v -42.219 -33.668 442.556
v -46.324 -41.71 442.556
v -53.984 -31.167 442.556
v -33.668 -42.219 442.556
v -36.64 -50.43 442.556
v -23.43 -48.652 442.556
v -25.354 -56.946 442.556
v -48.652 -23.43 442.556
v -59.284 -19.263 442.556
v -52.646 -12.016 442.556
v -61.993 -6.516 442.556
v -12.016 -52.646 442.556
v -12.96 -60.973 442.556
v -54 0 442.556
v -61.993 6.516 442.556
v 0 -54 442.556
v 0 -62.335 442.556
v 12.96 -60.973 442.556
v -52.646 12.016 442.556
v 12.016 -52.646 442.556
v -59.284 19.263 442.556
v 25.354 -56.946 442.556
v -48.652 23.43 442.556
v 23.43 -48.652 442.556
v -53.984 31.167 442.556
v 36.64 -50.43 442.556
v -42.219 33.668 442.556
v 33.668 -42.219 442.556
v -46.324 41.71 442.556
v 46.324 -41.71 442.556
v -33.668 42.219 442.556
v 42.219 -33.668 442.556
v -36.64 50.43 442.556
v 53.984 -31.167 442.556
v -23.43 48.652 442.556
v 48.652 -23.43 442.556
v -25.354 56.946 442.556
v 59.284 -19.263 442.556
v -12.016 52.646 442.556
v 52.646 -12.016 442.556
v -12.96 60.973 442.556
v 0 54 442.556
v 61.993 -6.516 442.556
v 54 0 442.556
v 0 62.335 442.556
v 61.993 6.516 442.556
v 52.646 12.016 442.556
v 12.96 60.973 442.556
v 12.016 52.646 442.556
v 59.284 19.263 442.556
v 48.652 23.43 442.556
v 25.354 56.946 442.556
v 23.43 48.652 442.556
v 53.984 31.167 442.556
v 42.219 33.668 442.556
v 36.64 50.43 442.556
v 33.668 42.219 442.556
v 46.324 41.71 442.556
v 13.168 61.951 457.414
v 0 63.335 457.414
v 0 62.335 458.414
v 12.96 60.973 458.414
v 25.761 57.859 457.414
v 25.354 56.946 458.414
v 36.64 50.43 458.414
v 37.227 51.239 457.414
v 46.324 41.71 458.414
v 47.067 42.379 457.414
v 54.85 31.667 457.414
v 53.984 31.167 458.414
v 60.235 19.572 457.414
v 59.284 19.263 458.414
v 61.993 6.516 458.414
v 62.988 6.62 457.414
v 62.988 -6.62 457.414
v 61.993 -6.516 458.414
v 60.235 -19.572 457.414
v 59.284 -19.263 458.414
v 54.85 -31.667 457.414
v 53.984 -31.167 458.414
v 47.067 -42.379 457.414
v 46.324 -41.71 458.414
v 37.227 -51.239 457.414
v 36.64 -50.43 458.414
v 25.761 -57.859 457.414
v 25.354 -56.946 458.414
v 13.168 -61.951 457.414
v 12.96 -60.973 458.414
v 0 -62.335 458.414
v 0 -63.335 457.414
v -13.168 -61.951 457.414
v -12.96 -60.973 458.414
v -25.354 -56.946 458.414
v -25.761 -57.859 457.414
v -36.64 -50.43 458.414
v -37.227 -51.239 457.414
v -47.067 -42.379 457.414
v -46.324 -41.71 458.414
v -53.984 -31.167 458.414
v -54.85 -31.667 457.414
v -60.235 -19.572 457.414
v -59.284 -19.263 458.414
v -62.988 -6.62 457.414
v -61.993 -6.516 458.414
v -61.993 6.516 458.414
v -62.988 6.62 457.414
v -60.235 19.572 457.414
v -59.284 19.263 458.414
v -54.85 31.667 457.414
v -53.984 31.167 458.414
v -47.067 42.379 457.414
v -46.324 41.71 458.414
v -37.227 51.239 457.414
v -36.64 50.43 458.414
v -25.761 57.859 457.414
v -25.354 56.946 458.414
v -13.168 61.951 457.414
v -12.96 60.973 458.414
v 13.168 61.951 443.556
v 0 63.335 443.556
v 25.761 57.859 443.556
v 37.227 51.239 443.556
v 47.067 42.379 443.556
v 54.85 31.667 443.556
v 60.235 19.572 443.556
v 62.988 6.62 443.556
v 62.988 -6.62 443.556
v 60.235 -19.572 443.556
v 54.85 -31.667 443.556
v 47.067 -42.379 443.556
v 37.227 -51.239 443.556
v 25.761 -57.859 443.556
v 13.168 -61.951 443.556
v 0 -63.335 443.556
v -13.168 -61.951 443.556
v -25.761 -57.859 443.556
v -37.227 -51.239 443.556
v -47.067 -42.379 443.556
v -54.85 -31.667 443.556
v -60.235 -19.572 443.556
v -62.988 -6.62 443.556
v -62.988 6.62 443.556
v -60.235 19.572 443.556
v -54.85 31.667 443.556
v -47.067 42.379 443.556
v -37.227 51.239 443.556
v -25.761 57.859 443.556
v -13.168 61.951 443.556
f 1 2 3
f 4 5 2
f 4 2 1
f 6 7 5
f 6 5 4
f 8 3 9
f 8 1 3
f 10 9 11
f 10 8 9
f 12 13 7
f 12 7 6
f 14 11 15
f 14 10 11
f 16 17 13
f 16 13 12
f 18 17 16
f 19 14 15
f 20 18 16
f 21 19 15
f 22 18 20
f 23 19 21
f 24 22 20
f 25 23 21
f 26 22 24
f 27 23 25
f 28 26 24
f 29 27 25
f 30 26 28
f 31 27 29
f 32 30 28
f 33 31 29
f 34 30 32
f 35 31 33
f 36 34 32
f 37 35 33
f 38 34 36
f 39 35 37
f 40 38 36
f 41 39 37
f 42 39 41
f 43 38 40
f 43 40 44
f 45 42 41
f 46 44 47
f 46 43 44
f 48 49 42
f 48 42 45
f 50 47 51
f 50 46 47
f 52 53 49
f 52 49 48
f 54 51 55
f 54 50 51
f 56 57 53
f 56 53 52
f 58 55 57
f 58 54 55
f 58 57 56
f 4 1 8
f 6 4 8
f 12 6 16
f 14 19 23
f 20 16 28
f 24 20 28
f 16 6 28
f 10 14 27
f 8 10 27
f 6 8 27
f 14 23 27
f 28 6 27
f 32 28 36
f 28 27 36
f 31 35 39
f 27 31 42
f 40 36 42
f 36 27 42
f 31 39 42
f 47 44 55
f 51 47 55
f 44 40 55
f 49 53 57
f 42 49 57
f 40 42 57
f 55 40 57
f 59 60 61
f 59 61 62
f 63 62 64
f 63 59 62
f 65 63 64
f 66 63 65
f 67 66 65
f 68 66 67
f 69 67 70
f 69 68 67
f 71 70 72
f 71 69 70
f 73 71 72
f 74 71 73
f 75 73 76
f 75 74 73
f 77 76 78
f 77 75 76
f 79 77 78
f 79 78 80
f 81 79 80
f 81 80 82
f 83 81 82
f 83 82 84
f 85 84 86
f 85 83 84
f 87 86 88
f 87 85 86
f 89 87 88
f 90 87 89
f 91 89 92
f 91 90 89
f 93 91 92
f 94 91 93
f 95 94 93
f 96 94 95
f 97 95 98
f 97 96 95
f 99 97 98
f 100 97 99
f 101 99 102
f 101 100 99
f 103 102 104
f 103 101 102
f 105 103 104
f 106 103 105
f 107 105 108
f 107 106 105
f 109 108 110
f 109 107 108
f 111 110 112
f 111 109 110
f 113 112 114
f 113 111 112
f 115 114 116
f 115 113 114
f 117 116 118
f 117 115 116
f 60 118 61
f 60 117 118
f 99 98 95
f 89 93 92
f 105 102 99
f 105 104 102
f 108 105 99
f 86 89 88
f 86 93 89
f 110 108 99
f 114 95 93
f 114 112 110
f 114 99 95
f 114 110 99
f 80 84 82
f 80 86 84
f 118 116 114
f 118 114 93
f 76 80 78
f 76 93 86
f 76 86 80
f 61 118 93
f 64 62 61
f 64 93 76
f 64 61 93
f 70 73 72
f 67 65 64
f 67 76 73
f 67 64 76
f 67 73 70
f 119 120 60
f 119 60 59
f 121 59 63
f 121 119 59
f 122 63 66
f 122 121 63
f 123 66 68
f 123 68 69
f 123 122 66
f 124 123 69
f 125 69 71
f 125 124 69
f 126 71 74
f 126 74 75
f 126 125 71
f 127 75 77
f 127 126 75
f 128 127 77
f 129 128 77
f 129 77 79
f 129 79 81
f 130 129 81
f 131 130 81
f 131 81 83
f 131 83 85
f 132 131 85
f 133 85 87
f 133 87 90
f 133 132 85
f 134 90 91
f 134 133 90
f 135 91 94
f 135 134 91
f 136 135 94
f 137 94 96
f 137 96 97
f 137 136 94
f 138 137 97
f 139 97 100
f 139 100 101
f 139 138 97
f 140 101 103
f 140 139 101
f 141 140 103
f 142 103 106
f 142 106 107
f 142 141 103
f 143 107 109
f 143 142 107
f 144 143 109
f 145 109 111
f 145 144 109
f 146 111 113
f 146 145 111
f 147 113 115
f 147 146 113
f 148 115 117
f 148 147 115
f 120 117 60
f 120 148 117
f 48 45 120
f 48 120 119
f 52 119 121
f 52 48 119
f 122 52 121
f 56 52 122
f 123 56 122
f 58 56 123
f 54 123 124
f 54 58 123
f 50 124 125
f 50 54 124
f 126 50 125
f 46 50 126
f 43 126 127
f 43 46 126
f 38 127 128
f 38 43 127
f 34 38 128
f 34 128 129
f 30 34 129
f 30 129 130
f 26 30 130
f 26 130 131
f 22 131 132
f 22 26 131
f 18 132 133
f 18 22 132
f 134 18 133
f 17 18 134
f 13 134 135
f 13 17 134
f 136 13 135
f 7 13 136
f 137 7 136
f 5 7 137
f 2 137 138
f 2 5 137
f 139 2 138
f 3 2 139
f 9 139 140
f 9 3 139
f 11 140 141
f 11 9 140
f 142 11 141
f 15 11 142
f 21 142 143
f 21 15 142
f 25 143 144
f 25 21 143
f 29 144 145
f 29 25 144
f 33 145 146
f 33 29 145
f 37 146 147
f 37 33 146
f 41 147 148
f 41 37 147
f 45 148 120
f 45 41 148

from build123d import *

# Parameters (mm, degrees)
CHAMFER1_SIZE       = 1
SKETCH2_R           = 54
BOSS_EXTRUDE1_DEPTH = 15.858462


with BuildPart() as part:
    # Sketch1 → Revolve3 (revolve)
    with BuildSketch(Plane(origin=(0, 0, 0), x_dir=(0, 0, -1), z_dir=(1, 0, 0))):
        with BuildLine():
            Line((-458.414283312, 54), (-458.414283312, 63.3349))
            Line((-458.414283312, 63.3349), (-442.555821638, 63.3349))
            Line((-442.555821638, 63.3349), (-442.555821638, 54))
            ThreePointArc((-442.555821638, 54), (-443.54515622, 27.008055426), (-443.875, 0))
            Line((-443.875, 0), (-451.375, 0))
            ThreePointArc((-451.375, 0), (-453.142234121, 27.228438761), (-458.414283312, 54))
        make_face()
    revolve(axis=Axis((0, 0, 662.018), (0, 0, -1)))

    # Chamfer1
    chamfer1_edges = [part.edges().sort_by_distance(p)[0] for p in [
        (0, -63.3349, 442.555821638),
        (0, -63.3349, 458.414283312),
    ]]
    chamfer(chamfer1_edges, length=CHAMFER1_SIZE)

    # Sketch2 → Boss-Extrude1 (add)
    with BuildSketch(Plane.XY.offset(458.414283312)):
        Circle(SKETCH2_R)
    extrude(amount=-BOSS_EXTRUDE1_DEPTH)


solid = part.part
